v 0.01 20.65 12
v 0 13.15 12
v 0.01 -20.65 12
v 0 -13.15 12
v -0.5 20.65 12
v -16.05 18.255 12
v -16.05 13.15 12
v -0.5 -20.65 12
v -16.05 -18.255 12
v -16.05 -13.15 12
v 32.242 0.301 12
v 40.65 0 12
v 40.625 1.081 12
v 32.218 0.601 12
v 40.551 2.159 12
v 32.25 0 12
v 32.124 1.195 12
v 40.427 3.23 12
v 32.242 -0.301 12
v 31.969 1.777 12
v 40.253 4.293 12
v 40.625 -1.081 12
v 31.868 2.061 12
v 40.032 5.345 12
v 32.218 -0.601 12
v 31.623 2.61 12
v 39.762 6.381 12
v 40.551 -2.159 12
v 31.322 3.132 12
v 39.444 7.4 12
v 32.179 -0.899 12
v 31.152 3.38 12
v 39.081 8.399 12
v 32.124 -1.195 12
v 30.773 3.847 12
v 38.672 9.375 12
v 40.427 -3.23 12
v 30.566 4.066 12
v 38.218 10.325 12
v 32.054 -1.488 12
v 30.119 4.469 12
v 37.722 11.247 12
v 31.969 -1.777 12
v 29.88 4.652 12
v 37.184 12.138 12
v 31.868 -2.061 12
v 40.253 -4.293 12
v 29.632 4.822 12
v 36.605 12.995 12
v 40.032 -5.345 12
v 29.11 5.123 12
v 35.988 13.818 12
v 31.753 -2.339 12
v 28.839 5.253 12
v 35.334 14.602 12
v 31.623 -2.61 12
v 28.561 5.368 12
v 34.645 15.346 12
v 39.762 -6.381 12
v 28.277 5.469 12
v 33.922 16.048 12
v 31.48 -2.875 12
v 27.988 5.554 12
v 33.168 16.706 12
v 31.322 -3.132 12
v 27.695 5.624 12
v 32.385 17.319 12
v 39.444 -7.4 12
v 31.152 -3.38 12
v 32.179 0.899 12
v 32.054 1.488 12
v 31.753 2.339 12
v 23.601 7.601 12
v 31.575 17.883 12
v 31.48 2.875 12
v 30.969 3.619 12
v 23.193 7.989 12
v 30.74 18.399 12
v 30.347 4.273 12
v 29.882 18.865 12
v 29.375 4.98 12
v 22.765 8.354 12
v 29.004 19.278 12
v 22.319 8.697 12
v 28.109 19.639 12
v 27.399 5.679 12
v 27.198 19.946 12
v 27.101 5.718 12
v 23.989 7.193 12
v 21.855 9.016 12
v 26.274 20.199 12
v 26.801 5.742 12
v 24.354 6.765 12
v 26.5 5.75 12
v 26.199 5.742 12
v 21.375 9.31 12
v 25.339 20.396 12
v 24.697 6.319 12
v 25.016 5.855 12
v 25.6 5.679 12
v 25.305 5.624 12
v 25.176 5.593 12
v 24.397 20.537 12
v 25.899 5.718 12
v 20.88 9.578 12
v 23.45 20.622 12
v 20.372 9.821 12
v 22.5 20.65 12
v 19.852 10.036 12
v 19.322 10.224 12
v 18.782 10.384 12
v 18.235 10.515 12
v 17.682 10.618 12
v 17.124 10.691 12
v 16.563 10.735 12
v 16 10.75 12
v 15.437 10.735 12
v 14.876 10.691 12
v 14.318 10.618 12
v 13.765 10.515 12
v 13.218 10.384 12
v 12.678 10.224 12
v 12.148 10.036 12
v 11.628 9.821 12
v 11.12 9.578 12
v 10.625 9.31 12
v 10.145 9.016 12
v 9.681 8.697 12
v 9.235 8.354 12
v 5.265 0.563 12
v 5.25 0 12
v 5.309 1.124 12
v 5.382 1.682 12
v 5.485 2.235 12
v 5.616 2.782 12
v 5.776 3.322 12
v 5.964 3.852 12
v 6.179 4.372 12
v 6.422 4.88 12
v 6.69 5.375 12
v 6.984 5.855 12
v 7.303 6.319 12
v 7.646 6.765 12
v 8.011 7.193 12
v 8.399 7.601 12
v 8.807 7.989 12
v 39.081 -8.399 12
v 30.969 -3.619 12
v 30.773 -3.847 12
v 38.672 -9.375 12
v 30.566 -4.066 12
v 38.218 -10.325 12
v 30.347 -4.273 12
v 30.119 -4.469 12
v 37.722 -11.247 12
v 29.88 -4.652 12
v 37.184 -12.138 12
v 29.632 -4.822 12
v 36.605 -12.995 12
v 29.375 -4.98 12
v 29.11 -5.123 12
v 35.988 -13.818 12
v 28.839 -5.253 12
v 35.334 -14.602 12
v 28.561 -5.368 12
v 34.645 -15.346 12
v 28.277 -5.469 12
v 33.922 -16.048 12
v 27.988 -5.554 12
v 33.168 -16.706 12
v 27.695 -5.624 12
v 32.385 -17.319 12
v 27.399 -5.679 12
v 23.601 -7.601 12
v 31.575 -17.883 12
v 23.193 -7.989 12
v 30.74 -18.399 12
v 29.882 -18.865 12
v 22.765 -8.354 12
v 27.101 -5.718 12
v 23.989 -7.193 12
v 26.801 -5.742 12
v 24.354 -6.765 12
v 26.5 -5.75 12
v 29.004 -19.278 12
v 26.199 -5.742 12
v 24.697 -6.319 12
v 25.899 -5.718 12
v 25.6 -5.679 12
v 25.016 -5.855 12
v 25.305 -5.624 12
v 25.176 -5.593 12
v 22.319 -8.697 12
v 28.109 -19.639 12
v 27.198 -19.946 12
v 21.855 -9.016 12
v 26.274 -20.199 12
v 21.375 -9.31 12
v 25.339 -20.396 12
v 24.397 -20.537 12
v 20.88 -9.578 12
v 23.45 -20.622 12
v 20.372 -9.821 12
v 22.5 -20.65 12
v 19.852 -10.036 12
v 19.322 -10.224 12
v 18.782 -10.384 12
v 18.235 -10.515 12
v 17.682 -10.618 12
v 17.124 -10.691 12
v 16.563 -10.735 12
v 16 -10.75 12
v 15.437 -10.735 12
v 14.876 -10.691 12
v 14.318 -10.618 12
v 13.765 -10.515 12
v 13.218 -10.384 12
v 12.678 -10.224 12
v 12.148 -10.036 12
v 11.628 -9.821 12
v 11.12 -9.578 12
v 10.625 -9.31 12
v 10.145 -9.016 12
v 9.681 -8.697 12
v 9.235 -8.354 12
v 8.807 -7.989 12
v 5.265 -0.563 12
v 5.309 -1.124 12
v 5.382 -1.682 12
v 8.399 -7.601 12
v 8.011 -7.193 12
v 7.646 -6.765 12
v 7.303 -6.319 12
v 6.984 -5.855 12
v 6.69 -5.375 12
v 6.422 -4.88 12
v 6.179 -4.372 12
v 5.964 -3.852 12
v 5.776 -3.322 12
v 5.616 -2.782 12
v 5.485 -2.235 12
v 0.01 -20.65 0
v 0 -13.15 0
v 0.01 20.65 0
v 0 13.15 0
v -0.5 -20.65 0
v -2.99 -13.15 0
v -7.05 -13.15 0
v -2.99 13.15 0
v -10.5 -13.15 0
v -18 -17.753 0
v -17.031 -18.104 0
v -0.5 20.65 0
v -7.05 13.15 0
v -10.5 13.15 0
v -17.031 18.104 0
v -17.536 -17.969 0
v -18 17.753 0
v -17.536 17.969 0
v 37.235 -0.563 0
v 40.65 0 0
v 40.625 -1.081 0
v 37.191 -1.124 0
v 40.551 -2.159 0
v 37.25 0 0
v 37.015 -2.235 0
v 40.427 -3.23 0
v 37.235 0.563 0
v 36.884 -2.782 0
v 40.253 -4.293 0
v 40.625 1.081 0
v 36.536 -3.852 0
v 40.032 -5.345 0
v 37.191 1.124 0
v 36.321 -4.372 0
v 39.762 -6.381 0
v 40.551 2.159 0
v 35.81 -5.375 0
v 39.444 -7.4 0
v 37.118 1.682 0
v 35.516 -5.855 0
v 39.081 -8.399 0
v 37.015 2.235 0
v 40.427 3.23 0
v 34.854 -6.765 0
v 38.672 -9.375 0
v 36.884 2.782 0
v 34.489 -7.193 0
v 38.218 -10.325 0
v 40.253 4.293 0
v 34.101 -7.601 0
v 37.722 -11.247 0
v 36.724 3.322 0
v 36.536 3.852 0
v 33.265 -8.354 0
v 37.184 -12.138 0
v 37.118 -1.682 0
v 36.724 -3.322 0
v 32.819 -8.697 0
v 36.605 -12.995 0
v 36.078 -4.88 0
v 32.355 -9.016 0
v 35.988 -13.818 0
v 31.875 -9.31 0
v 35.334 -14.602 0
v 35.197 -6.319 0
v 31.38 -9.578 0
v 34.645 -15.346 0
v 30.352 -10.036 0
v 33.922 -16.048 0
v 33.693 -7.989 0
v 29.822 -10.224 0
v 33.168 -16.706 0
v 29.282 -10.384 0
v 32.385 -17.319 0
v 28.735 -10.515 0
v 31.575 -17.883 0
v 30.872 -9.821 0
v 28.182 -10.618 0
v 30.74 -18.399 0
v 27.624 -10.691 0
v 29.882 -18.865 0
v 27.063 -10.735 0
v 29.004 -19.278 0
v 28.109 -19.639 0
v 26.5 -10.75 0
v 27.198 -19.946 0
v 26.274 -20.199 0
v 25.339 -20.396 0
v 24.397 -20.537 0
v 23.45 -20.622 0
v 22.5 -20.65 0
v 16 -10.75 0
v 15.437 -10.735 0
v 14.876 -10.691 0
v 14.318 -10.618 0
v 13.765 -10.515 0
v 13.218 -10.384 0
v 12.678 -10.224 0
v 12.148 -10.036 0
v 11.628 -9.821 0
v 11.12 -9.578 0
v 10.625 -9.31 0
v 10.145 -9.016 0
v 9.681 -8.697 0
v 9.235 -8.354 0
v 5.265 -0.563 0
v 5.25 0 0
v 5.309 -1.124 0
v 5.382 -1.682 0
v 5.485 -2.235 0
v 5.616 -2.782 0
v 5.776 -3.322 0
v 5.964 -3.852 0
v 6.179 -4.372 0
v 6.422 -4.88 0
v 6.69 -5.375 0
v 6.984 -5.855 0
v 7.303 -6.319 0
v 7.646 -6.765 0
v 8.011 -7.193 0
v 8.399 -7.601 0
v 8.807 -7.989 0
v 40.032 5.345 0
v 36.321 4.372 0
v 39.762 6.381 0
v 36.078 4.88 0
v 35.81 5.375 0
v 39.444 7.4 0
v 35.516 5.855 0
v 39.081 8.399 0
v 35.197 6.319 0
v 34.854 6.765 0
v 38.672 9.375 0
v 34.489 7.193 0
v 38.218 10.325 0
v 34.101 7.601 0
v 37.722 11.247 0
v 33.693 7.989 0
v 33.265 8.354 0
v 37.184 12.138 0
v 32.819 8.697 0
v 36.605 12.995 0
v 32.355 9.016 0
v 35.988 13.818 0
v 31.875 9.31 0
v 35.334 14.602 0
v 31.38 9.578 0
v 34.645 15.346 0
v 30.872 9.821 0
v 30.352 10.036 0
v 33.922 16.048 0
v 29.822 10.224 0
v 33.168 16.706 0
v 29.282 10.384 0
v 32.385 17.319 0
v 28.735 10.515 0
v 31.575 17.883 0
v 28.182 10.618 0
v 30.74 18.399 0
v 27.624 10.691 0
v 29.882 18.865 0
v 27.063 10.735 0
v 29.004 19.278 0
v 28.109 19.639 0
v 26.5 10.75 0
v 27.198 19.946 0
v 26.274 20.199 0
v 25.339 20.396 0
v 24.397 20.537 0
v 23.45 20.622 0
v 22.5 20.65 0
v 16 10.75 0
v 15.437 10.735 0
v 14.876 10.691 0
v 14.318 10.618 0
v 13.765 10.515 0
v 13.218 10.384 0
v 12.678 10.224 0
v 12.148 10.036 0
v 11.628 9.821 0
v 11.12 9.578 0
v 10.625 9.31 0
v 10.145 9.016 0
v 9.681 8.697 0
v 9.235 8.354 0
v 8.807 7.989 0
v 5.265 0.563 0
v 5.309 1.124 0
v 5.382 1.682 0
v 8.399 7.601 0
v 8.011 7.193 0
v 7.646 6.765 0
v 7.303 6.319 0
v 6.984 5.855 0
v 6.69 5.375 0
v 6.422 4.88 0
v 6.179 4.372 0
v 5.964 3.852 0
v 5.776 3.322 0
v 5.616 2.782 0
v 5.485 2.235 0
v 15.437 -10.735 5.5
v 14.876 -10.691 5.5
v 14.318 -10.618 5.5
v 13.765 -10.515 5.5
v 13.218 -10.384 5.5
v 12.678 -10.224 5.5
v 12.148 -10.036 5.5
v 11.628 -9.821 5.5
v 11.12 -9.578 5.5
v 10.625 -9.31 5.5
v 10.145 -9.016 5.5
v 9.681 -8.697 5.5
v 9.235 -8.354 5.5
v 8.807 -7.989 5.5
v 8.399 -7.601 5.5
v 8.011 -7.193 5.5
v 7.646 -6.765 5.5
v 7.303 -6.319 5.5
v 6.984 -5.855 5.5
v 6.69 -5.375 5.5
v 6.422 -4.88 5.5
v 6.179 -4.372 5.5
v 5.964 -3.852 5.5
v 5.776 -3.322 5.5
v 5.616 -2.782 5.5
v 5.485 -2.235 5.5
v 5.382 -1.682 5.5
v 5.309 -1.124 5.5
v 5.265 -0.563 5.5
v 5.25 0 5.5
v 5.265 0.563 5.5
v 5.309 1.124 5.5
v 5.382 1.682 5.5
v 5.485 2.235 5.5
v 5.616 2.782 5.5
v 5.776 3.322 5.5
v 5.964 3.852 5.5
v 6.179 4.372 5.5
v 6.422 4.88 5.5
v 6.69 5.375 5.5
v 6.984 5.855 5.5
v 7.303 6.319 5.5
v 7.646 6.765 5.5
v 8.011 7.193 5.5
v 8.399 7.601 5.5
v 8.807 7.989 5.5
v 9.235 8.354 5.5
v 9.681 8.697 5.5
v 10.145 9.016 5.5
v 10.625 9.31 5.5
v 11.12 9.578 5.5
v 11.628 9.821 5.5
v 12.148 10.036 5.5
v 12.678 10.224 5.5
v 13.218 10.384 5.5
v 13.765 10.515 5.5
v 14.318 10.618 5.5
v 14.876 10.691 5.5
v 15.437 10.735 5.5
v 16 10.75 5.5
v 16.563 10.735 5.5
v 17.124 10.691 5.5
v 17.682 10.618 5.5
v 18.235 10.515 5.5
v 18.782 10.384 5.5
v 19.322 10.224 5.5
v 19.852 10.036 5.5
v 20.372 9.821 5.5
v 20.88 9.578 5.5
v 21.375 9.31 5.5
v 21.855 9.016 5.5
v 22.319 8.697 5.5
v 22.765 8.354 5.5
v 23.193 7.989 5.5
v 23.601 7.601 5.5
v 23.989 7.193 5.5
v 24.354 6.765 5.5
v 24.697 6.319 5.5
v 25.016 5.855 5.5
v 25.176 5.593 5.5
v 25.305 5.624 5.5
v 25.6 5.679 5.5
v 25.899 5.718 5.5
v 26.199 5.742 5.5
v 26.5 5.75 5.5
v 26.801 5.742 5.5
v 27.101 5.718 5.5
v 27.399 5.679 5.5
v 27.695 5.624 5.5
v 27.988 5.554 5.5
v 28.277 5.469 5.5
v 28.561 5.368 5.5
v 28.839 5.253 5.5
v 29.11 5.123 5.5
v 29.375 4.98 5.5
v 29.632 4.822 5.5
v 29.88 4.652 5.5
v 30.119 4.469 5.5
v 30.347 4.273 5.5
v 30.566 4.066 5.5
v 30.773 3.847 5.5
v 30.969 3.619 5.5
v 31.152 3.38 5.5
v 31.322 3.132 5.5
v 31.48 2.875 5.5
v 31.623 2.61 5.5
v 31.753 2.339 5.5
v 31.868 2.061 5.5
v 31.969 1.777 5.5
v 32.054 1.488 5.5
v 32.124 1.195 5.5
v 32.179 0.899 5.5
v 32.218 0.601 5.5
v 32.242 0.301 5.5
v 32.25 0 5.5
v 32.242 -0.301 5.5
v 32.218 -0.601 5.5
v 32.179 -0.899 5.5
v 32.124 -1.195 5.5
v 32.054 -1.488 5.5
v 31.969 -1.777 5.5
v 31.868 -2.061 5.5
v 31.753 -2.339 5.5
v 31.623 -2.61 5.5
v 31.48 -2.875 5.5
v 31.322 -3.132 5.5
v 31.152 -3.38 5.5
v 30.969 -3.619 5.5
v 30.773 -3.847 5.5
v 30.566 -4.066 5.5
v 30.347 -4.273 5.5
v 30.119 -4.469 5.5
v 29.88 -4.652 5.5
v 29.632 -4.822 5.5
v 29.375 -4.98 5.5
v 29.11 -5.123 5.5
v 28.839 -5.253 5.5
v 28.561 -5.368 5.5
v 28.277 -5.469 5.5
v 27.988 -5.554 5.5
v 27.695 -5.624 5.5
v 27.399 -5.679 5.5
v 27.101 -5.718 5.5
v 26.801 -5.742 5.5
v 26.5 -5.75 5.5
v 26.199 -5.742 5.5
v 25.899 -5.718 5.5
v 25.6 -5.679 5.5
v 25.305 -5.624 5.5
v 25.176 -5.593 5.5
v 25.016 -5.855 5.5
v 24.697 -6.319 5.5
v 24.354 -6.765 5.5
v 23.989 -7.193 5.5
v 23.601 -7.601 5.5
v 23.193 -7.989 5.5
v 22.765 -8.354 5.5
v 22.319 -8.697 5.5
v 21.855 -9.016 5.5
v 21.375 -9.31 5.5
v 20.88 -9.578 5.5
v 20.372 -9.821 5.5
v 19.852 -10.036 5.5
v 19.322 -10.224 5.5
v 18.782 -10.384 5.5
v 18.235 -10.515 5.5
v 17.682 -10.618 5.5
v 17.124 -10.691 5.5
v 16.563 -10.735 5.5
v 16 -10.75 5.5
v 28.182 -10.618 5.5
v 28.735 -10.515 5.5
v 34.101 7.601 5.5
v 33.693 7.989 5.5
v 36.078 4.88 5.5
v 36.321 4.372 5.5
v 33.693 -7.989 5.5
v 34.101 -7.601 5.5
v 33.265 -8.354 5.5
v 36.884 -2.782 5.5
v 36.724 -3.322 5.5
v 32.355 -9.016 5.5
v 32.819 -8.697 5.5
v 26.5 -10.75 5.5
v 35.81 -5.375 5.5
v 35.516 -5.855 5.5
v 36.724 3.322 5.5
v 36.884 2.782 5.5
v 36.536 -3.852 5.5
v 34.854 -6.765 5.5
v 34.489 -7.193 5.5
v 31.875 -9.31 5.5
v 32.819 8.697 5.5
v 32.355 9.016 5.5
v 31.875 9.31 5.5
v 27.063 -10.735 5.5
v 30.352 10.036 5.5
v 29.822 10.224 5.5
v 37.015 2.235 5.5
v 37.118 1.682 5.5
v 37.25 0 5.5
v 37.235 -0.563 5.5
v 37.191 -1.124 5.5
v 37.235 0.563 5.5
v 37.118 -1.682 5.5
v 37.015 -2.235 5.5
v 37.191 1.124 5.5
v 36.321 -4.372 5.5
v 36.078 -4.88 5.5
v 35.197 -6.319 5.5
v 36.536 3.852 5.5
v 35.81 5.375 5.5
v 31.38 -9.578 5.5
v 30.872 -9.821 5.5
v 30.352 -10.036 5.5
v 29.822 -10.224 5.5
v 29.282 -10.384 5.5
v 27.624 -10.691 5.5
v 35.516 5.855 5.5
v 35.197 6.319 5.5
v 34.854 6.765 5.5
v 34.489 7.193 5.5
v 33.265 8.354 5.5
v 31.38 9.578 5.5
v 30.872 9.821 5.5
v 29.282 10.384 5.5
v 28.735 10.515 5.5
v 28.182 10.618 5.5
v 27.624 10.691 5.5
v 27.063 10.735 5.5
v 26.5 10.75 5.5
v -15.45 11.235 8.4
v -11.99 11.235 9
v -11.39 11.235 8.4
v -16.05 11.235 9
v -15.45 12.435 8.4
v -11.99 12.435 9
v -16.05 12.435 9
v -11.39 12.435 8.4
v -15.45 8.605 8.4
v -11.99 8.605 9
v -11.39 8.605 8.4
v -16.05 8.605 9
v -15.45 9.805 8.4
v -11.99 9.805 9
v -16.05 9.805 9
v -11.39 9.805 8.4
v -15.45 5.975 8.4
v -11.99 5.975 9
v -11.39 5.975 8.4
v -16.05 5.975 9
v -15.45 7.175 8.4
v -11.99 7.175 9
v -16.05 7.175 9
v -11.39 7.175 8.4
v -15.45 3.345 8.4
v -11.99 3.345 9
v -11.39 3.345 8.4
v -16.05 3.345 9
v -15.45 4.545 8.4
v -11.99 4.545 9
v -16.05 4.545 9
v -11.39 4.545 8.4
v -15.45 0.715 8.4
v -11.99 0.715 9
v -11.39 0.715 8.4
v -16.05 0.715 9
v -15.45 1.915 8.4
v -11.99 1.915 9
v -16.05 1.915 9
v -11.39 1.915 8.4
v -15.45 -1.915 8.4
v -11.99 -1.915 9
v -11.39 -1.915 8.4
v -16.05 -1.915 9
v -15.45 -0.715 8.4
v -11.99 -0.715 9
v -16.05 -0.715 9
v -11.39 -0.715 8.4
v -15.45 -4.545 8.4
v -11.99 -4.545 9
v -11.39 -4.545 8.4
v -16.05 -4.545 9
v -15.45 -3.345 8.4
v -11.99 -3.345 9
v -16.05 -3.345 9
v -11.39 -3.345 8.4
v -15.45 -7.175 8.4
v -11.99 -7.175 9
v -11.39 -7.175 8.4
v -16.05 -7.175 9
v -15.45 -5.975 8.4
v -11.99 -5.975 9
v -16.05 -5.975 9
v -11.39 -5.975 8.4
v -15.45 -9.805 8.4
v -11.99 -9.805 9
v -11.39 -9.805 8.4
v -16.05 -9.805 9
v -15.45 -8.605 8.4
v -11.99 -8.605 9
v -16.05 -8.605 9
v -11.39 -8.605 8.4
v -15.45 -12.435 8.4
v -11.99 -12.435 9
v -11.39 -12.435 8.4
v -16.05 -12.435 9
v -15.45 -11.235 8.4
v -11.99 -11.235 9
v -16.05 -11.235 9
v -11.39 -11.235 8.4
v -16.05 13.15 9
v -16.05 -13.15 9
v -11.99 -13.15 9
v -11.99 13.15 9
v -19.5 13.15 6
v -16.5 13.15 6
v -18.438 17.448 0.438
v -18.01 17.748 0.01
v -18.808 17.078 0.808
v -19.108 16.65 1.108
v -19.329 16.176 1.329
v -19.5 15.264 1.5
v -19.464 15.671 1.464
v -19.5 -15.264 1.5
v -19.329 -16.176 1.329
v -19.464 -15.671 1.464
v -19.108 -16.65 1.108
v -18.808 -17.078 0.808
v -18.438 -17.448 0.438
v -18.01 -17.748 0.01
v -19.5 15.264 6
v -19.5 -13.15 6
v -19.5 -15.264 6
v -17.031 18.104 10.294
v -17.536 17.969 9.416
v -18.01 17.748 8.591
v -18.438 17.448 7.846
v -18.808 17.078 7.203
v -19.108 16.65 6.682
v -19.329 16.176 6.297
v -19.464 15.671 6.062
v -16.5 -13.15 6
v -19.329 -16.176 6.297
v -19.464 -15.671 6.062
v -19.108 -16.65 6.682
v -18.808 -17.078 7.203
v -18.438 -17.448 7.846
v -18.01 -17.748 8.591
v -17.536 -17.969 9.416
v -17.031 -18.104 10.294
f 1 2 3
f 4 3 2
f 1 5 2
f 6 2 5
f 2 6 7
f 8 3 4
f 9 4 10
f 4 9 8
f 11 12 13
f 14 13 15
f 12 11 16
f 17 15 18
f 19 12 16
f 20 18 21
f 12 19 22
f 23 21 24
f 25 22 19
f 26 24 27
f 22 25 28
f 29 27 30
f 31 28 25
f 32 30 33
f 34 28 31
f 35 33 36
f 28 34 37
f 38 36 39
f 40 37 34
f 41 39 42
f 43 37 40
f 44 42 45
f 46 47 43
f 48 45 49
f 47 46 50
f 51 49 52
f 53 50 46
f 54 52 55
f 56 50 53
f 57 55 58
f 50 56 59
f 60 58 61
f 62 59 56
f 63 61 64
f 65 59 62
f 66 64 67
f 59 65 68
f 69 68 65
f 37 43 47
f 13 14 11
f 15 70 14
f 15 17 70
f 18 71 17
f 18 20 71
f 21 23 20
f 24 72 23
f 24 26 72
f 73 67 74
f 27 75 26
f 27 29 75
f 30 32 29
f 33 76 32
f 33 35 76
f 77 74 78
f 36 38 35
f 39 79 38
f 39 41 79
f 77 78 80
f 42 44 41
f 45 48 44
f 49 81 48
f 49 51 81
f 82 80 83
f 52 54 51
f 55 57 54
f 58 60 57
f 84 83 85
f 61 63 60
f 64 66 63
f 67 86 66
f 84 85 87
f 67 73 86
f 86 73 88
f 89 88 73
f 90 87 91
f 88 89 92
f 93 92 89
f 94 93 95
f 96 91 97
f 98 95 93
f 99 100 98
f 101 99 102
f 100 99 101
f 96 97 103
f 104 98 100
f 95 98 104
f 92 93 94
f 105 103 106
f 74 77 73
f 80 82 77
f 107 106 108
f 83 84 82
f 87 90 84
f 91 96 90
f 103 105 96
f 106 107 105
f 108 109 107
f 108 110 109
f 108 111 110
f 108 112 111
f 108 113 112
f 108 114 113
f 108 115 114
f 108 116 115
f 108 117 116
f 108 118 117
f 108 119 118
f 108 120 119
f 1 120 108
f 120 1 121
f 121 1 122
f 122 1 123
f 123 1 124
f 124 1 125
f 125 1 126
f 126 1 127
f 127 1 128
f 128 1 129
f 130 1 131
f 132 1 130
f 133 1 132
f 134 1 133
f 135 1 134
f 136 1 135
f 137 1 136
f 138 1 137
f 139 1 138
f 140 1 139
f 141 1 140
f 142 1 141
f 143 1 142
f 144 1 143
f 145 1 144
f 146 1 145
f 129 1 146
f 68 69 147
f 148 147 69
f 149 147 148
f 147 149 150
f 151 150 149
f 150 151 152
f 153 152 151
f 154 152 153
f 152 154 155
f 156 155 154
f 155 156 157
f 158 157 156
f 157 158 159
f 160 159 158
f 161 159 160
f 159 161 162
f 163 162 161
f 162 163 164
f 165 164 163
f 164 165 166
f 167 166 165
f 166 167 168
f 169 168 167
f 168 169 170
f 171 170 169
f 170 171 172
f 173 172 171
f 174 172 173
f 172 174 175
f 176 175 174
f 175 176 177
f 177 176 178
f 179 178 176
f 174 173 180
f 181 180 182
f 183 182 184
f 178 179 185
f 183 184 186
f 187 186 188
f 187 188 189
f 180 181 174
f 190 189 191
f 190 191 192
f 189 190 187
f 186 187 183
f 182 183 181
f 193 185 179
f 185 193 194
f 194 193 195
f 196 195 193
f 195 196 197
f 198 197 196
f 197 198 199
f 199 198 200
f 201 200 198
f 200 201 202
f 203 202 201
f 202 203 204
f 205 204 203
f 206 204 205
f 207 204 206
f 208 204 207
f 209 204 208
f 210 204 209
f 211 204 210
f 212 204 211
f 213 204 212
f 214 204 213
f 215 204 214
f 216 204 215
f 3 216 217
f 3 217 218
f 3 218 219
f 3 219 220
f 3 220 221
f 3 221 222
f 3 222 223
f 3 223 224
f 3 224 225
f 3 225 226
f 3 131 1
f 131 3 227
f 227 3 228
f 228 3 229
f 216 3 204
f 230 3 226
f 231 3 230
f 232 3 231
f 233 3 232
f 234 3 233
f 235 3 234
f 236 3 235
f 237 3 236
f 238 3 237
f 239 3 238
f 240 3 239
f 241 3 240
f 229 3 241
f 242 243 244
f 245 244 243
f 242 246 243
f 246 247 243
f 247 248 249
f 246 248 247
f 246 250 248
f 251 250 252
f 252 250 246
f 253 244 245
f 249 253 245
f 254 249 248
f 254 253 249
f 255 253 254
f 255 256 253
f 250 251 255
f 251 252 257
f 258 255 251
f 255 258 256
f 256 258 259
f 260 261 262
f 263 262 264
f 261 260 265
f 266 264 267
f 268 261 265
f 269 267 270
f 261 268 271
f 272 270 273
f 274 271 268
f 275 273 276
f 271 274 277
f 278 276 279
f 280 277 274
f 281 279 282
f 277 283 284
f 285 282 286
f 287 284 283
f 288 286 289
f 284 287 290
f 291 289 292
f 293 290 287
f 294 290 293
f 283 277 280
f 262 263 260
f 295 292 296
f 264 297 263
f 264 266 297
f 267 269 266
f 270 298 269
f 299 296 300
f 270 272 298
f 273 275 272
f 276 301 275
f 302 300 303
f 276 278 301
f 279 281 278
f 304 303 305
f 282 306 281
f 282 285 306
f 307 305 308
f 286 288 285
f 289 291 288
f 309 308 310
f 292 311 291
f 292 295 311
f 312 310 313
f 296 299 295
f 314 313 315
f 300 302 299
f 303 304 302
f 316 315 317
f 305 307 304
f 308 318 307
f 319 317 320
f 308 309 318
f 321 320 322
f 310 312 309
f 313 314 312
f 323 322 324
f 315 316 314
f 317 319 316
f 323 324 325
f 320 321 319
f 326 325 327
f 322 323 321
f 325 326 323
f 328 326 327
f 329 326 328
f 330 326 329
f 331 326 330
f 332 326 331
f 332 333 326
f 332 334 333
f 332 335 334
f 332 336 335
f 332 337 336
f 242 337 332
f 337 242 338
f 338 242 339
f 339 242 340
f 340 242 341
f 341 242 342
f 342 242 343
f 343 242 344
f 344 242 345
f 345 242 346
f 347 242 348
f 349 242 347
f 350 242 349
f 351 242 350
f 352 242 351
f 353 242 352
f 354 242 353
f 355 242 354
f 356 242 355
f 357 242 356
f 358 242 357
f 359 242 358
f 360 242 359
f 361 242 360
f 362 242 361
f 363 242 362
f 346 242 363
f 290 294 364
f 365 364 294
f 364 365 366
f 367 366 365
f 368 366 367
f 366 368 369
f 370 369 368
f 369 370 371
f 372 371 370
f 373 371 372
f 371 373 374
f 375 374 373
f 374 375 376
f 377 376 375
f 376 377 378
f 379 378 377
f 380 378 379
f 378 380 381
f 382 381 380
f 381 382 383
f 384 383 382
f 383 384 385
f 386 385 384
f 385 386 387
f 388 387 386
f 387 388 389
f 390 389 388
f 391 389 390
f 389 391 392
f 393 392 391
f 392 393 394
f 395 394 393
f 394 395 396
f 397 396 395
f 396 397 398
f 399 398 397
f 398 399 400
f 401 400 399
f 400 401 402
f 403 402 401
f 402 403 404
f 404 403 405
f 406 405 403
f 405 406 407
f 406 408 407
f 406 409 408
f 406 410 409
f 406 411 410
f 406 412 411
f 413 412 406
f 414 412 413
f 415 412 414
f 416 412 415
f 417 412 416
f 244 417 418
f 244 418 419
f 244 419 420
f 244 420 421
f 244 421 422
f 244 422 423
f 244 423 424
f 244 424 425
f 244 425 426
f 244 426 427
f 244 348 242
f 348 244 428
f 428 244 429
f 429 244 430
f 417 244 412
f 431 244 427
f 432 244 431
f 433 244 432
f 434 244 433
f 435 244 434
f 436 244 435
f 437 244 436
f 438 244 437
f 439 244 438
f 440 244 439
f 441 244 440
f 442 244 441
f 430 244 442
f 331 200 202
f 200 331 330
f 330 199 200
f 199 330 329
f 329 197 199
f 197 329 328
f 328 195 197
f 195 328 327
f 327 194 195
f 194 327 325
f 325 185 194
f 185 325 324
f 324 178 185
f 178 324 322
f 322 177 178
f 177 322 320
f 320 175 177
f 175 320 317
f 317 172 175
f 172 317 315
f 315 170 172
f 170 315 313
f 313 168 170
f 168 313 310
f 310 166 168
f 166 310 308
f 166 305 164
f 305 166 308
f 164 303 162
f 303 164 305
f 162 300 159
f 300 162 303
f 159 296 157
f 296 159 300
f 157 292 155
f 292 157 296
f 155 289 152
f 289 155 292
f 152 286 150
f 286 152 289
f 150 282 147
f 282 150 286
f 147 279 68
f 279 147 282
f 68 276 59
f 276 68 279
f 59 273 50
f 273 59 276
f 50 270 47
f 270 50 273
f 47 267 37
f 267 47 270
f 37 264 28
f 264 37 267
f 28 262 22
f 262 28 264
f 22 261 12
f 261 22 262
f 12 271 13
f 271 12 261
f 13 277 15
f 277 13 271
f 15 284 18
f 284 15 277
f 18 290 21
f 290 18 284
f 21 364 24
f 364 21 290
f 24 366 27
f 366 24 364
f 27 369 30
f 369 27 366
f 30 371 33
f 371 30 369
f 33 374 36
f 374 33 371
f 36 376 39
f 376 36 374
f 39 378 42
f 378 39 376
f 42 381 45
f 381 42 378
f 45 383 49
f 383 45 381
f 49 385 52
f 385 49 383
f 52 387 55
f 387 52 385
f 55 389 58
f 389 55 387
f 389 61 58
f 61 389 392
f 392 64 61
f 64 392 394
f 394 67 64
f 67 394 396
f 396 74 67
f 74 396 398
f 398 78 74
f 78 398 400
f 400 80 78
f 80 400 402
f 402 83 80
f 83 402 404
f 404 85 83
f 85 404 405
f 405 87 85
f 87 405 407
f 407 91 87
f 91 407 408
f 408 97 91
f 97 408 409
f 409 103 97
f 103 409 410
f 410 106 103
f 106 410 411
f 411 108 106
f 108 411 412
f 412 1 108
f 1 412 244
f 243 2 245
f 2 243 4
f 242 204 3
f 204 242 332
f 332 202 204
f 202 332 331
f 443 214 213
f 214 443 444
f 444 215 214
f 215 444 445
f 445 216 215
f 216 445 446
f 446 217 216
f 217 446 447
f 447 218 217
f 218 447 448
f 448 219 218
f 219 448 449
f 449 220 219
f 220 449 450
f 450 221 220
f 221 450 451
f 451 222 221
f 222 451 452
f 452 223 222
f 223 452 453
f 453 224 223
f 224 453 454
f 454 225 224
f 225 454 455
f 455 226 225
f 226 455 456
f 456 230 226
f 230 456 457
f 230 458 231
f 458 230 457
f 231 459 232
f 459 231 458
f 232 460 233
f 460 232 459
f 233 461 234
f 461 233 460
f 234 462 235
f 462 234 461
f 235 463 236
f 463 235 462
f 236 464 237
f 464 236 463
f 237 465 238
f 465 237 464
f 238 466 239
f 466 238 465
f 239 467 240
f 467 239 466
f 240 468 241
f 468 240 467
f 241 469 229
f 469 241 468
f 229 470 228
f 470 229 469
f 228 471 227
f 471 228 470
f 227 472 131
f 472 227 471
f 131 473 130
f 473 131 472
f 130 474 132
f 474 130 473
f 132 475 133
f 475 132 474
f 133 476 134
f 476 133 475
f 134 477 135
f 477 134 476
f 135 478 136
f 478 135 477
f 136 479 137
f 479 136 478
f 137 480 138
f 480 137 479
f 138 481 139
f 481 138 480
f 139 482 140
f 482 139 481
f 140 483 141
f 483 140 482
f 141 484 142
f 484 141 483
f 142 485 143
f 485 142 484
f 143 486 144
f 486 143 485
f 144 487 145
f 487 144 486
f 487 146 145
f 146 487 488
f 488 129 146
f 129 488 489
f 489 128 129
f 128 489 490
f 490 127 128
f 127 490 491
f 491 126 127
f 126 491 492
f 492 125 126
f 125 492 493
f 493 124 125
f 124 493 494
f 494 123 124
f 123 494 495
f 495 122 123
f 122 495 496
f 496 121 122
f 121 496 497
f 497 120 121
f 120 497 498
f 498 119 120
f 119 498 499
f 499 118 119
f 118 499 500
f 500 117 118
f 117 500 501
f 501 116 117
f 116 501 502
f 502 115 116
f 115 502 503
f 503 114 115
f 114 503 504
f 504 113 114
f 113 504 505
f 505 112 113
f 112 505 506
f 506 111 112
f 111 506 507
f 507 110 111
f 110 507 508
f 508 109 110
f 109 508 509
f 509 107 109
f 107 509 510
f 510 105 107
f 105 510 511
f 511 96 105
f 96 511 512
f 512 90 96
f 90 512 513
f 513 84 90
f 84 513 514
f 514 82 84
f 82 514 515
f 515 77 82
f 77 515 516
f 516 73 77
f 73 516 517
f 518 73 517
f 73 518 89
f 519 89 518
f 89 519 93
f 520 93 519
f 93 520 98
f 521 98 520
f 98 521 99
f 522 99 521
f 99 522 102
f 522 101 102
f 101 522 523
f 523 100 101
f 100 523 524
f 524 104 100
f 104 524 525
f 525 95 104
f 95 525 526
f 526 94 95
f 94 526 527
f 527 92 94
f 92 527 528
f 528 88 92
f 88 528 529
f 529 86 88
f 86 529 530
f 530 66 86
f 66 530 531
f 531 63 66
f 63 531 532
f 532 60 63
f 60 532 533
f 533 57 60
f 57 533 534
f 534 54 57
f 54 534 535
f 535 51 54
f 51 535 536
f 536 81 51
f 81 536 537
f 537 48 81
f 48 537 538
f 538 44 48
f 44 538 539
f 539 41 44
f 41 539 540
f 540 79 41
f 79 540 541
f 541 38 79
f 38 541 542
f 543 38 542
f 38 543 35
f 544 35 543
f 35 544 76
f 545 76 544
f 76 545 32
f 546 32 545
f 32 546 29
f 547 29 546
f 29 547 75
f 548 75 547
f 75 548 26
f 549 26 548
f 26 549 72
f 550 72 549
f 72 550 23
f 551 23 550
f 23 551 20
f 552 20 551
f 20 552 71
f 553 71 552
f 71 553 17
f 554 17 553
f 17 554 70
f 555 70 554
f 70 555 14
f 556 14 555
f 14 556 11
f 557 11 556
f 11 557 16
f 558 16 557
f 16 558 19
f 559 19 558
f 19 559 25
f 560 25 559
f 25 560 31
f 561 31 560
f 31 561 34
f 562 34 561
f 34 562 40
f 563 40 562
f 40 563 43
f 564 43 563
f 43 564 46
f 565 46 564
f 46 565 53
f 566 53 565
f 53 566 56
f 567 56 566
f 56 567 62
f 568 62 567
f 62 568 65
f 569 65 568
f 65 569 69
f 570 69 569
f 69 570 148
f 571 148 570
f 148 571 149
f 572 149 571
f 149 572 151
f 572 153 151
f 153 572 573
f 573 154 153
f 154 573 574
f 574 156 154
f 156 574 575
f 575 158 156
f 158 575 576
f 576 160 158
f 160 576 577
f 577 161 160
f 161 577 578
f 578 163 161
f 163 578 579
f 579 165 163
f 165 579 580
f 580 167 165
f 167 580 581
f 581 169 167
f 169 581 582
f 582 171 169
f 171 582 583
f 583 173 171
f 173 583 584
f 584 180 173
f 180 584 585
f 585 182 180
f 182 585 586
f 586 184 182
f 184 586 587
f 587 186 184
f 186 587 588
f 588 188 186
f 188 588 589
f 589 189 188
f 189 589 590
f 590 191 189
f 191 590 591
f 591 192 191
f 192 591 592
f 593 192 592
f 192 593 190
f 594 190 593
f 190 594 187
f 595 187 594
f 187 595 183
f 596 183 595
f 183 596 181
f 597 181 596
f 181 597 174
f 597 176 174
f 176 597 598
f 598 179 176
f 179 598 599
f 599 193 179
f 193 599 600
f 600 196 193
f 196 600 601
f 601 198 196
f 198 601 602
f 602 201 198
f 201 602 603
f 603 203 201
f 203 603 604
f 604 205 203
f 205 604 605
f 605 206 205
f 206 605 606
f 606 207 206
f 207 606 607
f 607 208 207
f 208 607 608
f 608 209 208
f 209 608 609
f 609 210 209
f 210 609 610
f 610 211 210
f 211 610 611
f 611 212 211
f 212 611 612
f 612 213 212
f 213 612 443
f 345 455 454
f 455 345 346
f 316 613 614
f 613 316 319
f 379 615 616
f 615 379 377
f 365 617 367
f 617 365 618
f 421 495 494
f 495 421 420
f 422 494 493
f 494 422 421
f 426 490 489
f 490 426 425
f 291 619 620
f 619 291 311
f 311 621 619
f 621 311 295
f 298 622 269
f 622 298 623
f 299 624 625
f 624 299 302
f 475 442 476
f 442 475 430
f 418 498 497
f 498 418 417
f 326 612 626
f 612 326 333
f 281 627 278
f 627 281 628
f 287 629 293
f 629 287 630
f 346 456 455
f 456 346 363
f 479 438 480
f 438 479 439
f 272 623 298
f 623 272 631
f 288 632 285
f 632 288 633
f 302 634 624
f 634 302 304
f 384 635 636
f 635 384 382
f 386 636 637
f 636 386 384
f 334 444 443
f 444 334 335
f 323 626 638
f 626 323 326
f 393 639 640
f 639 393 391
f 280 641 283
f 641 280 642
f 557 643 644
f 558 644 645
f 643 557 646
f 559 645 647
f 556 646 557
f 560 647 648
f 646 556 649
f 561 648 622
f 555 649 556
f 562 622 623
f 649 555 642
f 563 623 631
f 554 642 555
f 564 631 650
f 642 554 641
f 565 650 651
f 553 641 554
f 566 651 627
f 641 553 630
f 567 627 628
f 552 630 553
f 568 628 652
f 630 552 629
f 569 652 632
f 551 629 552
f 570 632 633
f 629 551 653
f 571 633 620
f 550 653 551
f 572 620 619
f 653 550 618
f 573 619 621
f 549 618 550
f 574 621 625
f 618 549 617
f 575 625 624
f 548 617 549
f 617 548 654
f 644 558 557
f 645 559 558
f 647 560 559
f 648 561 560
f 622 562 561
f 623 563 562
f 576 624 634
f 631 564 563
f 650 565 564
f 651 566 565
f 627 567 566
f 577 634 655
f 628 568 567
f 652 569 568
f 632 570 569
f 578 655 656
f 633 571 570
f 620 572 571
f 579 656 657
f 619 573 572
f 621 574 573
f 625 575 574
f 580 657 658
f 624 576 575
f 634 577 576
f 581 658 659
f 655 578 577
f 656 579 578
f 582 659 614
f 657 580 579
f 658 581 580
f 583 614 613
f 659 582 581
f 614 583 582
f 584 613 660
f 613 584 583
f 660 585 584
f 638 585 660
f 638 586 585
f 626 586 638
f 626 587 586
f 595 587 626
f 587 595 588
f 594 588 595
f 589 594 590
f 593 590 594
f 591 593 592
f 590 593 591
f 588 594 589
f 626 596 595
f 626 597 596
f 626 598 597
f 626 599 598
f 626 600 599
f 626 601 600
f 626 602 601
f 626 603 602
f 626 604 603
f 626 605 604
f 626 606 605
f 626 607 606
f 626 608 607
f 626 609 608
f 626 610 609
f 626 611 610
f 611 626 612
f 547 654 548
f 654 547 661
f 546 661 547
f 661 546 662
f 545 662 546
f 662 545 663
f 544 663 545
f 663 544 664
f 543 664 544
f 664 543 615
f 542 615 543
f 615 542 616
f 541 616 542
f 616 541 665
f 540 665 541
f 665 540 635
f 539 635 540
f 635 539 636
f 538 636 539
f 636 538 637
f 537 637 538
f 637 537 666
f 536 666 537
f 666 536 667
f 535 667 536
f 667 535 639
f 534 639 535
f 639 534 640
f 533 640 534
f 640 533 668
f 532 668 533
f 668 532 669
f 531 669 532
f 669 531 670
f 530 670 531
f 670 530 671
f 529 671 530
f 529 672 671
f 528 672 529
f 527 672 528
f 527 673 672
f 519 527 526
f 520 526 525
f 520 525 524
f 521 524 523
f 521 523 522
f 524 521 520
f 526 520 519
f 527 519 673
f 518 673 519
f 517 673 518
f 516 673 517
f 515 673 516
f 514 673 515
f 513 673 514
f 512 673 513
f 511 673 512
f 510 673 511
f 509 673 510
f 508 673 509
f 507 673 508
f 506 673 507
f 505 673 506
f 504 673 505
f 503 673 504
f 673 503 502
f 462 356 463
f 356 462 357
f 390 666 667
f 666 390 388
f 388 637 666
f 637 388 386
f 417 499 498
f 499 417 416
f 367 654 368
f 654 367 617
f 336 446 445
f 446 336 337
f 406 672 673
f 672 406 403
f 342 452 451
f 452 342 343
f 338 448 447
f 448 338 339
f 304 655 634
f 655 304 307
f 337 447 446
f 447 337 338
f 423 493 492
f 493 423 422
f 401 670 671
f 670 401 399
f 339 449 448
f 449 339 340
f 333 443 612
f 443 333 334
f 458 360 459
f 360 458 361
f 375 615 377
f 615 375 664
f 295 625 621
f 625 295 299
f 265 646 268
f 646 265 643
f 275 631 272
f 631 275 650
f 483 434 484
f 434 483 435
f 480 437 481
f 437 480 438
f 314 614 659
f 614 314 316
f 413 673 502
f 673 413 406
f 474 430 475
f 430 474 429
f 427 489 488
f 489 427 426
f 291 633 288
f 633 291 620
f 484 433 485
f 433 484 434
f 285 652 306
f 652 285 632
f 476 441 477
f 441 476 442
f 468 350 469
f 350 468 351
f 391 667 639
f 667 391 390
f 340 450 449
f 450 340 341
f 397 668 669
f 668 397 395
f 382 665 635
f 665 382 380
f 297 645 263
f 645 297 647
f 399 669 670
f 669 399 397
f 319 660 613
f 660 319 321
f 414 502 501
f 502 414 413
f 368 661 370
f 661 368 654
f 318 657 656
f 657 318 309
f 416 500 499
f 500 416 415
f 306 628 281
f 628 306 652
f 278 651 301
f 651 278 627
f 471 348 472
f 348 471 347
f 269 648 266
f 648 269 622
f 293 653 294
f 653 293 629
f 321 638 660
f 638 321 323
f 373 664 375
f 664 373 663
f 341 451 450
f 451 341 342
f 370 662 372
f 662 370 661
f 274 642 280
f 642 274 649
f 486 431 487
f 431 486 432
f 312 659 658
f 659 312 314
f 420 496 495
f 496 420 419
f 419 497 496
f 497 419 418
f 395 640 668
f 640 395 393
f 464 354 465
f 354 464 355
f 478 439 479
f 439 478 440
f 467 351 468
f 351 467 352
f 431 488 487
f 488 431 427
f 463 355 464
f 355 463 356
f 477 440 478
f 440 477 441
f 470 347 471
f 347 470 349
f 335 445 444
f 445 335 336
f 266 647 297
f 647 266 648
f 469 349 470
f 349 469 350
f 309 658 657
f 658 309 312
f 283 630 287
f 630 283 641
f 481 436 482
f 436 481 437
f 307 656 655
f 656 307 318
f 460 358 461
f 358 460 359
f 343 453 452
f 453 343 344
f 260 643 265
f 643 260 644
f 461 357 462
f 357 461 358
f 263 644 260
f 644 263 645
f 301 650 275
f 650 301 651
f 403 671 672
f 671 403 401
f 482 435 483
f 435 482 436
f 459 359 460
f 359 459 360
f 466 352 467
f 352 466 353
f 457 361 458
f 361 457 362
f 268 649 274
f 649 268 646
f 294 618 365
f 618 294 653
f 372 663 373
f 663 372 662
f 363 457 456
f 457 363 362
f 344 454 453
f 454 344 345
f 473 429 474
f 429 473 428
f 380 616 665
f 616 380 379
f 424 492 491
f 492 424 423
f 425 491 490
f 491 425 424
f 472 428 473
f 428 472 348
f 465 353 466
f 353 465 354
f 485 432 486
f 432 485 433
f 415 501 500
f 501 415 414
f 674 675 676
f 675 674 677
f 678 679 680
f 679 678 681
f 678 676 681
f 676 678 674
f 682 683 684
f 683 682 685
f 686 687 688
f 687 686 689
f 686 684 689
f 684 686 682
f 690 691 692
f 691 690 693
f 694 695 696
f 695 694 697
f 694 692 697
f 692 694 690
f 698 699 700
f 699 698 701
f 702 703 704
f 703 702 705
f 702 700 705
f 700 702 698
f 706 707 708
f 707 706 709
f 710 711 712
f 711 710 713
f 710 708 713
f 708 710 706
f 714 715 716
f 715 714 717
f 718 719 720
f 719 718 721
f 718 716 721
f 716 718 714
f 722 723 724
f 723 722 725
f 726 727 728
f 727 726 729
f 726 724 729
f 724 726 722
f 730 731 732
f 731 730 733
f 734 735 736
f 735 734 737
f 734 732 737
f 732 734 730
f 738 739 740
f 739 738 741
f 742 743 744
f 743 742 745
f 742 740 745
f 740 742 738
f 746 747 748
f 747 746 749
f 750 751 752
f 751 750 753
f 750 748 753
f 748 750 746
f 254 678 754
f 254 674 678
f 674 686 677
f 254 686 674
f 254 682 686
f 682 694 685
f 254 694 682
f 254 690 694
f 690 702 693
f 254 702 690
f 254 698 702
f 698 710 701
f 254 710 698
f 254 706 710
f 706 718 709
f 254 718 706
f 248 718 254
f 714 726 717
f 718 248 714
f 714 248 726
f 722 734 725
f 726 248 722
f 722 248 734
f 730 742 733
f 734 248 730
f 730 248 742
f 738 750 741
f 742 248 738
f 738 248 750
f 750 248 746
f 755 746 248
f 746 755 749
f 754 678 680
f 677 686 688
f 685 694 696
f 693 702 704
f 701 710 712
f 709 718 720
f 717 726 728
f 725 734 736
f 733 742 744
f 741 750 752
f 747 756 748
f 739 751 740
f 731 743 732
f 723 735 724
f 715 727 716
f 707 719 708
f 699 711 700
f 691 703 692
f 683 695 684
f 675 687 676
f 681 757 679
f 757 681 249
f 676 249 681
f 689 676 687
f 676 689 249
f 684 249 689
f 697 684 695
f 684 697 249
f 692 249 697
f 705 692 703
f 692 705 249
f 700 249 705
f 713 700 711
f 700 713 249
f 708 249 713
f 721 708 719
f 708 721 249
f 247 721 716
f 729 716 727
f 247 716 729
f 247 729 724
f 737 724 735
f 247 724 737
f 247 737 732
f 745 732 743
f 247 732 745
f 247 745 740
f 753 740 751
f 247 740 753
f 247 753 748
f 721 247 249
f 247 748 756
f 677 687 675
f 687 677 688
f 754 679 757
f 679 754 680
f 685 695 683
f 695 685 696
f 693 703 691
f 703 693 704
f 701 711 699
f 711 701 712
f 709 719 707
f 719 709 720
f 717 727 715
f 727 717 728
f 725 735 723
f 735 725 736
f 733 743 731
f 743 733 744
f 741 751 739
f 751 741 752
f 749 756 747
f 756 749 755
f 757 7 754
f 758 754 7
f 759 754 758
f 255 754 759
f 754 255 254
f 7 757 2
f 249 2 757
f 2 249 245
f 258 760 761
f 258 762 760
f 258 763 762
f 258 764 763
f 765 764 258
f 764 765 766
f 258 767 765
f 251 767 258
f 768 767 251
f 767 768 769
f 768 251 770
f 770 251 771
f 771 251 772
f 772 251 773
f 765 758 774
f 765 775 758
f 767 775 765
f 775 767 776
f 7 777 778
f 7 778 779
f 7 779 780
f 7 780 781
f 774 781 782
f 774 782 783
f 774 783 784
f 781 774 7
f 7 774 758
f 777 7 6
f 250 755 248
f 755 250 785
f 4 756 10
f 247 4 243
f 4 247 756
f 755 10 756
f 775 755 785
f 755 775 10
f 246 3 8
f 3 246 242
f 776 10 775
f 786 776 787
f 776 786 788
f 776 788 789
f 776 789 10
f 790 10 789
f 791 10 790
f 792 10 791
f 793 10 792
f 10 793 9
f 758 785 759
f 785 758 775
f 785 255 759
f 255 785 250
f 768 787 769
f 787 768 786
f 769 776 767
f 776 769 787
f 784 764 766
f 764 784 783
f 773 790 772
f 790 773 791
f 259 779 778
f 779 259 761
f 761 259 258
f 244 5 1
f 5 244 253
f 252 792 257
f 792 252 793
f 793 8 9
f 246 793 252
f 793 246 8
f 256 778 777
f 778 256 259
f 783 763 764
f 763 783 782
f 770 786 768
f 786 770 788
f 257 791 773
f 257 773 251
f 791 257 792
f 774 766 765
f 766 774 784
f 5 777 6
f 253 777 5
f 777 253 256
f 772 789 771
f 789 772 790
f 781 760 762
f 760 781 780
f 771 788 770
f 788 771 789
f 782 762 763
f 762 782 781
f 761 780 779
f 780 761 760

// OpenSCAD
needsSupport = 1; // [0:No, 1:Yes]
seatBungeeClip = 0; // [0:No, 1:Left, 2:Right]
sideReinforce = 3;

strapBarLength = 26.3;
strapSlitThickness = 3.45; // orig: 3.77
strapBarTopWidth = 4.06;
strapBarHeight = 9; 
sideMin=5;
sideMax=7.5;
toothWidth = 1.2;
toothDepth = 0.6;
rearBarHeight = 6;
rearBarWidth = 9;
outerMinorDiameter = 36.3;

attachmentOffset = 3;

bigHole = 21.5;
smallHole = 11.5;
smallHoleOffset = 10.5;
bigThickness = 12; 
smallThickness = 6.5;
outerCircleOffset = 6.5;
frontBackOffset = 16;
rounding = 3;
bottomIncut = 1.5;
bottomSmallIncut = 1.5;

fingerSpacing = 6;
fingerWidth = 5.5;
fingerSizeAdjust = 1;
fingerInset = 6;
fingerForwardShift = 1;
fingerInsideForwardShift = 1;
rearBungeeKeeperStickout = 7;

module dummy() {}

outerDiameter = strapBarLength + 2 * sideMax;
rearThickness = bigThickness;//was strapBarHeight

nudge = .01;

module strapHolderBasic() {
    
    strapBarProfile = [[0,0],[strapBarTopWidth,0],
        [strapBarTopWidth+strapBarHeight,strapBarHeight],[strapBarHeight,strapBarHeight]];
    toothCount0 = floor(strapBarLength / (2*toothWidth));
    toothCount = floor(toothCount0 / 2)*2;
    difference() {
        translate([0,0,-nudge]) linear_extrude(height=2*nudge+strapBarLength) polygon(strapBarProfile);
        for (i=[0:toothCount-1]) {
            z = strapBarLength/2+(i-toothCount/2+.5)/toothCount*strapBarLength;
            translate([0,strapBarHeight-toothDepth,z-toothWidth/2])
                cube([strapBarHeight+strapBarTopWidth+nudge,toothDepth+nudge,toothWidth]);
        }
    }
    
    function supportProfile(incut) = 
    [ [ strapBarTopWidth+strapSlitThickness, 0] , [ strapBarTopWidth+strapSlitThickness + rearBarWidth-incut, 0],
    [ strapBarTopWidth+strapSlitThickness + rearBarWidth, incut],
    [ strapBarTopWidth+strapSlitThickness + rearBarWidth, rearBarHeight],
    [ strapBarTopWidth+strapSlitThickness+rearBarHeight,rearBarHeight] ];
    translate([0,0,-sideMax])
    linear_extrude(height=strapBarLength+2*sideMax)
        polygon(supportProfile(bottomIncut));
    
    for (z=[-sideMax,strapBarLength]) 
        translate([0,0,z]) linear_extrude(height=sideMax) hull() {
        translate([0,0]) polygon(supportProfile(bottomSmallIncut));
        translate([0,0]) polygon(strapBarProfile);
        translate([0,rearThickness-strapBarHeight]) polygon(strapBarProfile);
        translate([-attachmentOffset,0]) polygon([[0,0],[0,bigThickness],[1,bigThickness],[1,0]]);
    }
    
}

module strapHolder() {
    intersection() {
        translate([-attachmentOffset+nudge, strapBarLength/2,0]) 
        mirror([1,0,0]) 
        rotate([90,0,0]) strapHolderBasic();
        
        linear_extrude(height=strapBarHeight+bigThickness) hull() {
            square([1,outerDiameter],center=true);
            for (s=[-1,1])
                translate([-attachmentOffset-strapBarHeight-strapBarTopWidth-strapSlitThickness+rounding,s*(strapBarLength/2 + sideMin-rounding)]) circle(r=rounding,$fn=36);
        }
    }
    if (seatBungeeClip && rearBungeeKeeperStickout>0)  {
        translate([-attachmentOffset-strapBarTopWidth-nudge,0,0]) 
        linear_extrude(height=rearBarHeight) for(s=[-1,1]) translate([-10,s*(fingerWidth/2+fingerSpacing/2)]) hull() {
            square([nudge,fingerWidth],center=true);
            translate([-rearBungeeKeeperStickout-3+fingerWidth/2,0,0]) {
                circle(d=fingerWidth,$fn=36);
                translate([-fingerWidth/4,-s*fingerWidth/4]) square(fingerWidth/2,center=true);
            }
        }
    }
}

module attachment() {
    $fn = 120;
    
    module finger(inside=false) {
        translate([fingerForwardShift,0,0]) {
            r = fingerSpacing+fingerWidth+fingerSizeAdjust;
            if (!inside)
            translate([r*.2,-fingerInset]) intersection() {
                circle(r=r);
                square([2*r,2*r-2*fingerSizeAdjust],center=true);
            }
            else
            translate([0,fingerSpacing/2]) {
                translate([fingerInsideForwardShift,-fingerInset]) hull() {
                    circle(d=fingerSpacing);
                    translate([100,0]) circle(d=fingerSpacing);
                }
            }
        }
    }
    
    module main() {
        difference() {
            union() {
                hull() {
                    translate([outerCircleOffset,0]) scale([outerMinorDiameter/outerDiameter,1]) circle(d=outerDiameter);
                    translate([-frontBackOffset,-outerDiameter/2]) square([1,outerDiameter]); 
                }
                if (seatBungeeClip) {
                    translate([-6,outerDiameter/2]) finger(false);
                }
            }
            if (seatBungeeClip) {
                    translate([-6,outerDiameter/2]) finger(true);
            }
            circle(d=bigHole);
            translate([smallHoleOffset,0]) circle(d=smallHole);
        }
    }
    translate([frontBackOffset,0,0]) 
    difference() {
        linear_extrude(height=bigThickness) 
            if (!seatBungeeClip || 
                (!needsSupport && seatBungeeClip==1) ||
                (needsSupport && seatBungeeClip==2)) main(); 
            else mirror([0,1]) main();
        hull() {
            translate([0,0,smallThickness])
            cylinder(d=bigHole,h=bigThickness);
            translate([smallHoleOffset,0,smallThickness]) 
            cylinder(d=bigHole,h=bigThickness);
        }
    }
}

if (!needsSupport) {
    attachment();
}
else {
    translate([0,0,bigThickness])
    mirror([0,0,1]) 
    attachment();
}

strapHolder();
